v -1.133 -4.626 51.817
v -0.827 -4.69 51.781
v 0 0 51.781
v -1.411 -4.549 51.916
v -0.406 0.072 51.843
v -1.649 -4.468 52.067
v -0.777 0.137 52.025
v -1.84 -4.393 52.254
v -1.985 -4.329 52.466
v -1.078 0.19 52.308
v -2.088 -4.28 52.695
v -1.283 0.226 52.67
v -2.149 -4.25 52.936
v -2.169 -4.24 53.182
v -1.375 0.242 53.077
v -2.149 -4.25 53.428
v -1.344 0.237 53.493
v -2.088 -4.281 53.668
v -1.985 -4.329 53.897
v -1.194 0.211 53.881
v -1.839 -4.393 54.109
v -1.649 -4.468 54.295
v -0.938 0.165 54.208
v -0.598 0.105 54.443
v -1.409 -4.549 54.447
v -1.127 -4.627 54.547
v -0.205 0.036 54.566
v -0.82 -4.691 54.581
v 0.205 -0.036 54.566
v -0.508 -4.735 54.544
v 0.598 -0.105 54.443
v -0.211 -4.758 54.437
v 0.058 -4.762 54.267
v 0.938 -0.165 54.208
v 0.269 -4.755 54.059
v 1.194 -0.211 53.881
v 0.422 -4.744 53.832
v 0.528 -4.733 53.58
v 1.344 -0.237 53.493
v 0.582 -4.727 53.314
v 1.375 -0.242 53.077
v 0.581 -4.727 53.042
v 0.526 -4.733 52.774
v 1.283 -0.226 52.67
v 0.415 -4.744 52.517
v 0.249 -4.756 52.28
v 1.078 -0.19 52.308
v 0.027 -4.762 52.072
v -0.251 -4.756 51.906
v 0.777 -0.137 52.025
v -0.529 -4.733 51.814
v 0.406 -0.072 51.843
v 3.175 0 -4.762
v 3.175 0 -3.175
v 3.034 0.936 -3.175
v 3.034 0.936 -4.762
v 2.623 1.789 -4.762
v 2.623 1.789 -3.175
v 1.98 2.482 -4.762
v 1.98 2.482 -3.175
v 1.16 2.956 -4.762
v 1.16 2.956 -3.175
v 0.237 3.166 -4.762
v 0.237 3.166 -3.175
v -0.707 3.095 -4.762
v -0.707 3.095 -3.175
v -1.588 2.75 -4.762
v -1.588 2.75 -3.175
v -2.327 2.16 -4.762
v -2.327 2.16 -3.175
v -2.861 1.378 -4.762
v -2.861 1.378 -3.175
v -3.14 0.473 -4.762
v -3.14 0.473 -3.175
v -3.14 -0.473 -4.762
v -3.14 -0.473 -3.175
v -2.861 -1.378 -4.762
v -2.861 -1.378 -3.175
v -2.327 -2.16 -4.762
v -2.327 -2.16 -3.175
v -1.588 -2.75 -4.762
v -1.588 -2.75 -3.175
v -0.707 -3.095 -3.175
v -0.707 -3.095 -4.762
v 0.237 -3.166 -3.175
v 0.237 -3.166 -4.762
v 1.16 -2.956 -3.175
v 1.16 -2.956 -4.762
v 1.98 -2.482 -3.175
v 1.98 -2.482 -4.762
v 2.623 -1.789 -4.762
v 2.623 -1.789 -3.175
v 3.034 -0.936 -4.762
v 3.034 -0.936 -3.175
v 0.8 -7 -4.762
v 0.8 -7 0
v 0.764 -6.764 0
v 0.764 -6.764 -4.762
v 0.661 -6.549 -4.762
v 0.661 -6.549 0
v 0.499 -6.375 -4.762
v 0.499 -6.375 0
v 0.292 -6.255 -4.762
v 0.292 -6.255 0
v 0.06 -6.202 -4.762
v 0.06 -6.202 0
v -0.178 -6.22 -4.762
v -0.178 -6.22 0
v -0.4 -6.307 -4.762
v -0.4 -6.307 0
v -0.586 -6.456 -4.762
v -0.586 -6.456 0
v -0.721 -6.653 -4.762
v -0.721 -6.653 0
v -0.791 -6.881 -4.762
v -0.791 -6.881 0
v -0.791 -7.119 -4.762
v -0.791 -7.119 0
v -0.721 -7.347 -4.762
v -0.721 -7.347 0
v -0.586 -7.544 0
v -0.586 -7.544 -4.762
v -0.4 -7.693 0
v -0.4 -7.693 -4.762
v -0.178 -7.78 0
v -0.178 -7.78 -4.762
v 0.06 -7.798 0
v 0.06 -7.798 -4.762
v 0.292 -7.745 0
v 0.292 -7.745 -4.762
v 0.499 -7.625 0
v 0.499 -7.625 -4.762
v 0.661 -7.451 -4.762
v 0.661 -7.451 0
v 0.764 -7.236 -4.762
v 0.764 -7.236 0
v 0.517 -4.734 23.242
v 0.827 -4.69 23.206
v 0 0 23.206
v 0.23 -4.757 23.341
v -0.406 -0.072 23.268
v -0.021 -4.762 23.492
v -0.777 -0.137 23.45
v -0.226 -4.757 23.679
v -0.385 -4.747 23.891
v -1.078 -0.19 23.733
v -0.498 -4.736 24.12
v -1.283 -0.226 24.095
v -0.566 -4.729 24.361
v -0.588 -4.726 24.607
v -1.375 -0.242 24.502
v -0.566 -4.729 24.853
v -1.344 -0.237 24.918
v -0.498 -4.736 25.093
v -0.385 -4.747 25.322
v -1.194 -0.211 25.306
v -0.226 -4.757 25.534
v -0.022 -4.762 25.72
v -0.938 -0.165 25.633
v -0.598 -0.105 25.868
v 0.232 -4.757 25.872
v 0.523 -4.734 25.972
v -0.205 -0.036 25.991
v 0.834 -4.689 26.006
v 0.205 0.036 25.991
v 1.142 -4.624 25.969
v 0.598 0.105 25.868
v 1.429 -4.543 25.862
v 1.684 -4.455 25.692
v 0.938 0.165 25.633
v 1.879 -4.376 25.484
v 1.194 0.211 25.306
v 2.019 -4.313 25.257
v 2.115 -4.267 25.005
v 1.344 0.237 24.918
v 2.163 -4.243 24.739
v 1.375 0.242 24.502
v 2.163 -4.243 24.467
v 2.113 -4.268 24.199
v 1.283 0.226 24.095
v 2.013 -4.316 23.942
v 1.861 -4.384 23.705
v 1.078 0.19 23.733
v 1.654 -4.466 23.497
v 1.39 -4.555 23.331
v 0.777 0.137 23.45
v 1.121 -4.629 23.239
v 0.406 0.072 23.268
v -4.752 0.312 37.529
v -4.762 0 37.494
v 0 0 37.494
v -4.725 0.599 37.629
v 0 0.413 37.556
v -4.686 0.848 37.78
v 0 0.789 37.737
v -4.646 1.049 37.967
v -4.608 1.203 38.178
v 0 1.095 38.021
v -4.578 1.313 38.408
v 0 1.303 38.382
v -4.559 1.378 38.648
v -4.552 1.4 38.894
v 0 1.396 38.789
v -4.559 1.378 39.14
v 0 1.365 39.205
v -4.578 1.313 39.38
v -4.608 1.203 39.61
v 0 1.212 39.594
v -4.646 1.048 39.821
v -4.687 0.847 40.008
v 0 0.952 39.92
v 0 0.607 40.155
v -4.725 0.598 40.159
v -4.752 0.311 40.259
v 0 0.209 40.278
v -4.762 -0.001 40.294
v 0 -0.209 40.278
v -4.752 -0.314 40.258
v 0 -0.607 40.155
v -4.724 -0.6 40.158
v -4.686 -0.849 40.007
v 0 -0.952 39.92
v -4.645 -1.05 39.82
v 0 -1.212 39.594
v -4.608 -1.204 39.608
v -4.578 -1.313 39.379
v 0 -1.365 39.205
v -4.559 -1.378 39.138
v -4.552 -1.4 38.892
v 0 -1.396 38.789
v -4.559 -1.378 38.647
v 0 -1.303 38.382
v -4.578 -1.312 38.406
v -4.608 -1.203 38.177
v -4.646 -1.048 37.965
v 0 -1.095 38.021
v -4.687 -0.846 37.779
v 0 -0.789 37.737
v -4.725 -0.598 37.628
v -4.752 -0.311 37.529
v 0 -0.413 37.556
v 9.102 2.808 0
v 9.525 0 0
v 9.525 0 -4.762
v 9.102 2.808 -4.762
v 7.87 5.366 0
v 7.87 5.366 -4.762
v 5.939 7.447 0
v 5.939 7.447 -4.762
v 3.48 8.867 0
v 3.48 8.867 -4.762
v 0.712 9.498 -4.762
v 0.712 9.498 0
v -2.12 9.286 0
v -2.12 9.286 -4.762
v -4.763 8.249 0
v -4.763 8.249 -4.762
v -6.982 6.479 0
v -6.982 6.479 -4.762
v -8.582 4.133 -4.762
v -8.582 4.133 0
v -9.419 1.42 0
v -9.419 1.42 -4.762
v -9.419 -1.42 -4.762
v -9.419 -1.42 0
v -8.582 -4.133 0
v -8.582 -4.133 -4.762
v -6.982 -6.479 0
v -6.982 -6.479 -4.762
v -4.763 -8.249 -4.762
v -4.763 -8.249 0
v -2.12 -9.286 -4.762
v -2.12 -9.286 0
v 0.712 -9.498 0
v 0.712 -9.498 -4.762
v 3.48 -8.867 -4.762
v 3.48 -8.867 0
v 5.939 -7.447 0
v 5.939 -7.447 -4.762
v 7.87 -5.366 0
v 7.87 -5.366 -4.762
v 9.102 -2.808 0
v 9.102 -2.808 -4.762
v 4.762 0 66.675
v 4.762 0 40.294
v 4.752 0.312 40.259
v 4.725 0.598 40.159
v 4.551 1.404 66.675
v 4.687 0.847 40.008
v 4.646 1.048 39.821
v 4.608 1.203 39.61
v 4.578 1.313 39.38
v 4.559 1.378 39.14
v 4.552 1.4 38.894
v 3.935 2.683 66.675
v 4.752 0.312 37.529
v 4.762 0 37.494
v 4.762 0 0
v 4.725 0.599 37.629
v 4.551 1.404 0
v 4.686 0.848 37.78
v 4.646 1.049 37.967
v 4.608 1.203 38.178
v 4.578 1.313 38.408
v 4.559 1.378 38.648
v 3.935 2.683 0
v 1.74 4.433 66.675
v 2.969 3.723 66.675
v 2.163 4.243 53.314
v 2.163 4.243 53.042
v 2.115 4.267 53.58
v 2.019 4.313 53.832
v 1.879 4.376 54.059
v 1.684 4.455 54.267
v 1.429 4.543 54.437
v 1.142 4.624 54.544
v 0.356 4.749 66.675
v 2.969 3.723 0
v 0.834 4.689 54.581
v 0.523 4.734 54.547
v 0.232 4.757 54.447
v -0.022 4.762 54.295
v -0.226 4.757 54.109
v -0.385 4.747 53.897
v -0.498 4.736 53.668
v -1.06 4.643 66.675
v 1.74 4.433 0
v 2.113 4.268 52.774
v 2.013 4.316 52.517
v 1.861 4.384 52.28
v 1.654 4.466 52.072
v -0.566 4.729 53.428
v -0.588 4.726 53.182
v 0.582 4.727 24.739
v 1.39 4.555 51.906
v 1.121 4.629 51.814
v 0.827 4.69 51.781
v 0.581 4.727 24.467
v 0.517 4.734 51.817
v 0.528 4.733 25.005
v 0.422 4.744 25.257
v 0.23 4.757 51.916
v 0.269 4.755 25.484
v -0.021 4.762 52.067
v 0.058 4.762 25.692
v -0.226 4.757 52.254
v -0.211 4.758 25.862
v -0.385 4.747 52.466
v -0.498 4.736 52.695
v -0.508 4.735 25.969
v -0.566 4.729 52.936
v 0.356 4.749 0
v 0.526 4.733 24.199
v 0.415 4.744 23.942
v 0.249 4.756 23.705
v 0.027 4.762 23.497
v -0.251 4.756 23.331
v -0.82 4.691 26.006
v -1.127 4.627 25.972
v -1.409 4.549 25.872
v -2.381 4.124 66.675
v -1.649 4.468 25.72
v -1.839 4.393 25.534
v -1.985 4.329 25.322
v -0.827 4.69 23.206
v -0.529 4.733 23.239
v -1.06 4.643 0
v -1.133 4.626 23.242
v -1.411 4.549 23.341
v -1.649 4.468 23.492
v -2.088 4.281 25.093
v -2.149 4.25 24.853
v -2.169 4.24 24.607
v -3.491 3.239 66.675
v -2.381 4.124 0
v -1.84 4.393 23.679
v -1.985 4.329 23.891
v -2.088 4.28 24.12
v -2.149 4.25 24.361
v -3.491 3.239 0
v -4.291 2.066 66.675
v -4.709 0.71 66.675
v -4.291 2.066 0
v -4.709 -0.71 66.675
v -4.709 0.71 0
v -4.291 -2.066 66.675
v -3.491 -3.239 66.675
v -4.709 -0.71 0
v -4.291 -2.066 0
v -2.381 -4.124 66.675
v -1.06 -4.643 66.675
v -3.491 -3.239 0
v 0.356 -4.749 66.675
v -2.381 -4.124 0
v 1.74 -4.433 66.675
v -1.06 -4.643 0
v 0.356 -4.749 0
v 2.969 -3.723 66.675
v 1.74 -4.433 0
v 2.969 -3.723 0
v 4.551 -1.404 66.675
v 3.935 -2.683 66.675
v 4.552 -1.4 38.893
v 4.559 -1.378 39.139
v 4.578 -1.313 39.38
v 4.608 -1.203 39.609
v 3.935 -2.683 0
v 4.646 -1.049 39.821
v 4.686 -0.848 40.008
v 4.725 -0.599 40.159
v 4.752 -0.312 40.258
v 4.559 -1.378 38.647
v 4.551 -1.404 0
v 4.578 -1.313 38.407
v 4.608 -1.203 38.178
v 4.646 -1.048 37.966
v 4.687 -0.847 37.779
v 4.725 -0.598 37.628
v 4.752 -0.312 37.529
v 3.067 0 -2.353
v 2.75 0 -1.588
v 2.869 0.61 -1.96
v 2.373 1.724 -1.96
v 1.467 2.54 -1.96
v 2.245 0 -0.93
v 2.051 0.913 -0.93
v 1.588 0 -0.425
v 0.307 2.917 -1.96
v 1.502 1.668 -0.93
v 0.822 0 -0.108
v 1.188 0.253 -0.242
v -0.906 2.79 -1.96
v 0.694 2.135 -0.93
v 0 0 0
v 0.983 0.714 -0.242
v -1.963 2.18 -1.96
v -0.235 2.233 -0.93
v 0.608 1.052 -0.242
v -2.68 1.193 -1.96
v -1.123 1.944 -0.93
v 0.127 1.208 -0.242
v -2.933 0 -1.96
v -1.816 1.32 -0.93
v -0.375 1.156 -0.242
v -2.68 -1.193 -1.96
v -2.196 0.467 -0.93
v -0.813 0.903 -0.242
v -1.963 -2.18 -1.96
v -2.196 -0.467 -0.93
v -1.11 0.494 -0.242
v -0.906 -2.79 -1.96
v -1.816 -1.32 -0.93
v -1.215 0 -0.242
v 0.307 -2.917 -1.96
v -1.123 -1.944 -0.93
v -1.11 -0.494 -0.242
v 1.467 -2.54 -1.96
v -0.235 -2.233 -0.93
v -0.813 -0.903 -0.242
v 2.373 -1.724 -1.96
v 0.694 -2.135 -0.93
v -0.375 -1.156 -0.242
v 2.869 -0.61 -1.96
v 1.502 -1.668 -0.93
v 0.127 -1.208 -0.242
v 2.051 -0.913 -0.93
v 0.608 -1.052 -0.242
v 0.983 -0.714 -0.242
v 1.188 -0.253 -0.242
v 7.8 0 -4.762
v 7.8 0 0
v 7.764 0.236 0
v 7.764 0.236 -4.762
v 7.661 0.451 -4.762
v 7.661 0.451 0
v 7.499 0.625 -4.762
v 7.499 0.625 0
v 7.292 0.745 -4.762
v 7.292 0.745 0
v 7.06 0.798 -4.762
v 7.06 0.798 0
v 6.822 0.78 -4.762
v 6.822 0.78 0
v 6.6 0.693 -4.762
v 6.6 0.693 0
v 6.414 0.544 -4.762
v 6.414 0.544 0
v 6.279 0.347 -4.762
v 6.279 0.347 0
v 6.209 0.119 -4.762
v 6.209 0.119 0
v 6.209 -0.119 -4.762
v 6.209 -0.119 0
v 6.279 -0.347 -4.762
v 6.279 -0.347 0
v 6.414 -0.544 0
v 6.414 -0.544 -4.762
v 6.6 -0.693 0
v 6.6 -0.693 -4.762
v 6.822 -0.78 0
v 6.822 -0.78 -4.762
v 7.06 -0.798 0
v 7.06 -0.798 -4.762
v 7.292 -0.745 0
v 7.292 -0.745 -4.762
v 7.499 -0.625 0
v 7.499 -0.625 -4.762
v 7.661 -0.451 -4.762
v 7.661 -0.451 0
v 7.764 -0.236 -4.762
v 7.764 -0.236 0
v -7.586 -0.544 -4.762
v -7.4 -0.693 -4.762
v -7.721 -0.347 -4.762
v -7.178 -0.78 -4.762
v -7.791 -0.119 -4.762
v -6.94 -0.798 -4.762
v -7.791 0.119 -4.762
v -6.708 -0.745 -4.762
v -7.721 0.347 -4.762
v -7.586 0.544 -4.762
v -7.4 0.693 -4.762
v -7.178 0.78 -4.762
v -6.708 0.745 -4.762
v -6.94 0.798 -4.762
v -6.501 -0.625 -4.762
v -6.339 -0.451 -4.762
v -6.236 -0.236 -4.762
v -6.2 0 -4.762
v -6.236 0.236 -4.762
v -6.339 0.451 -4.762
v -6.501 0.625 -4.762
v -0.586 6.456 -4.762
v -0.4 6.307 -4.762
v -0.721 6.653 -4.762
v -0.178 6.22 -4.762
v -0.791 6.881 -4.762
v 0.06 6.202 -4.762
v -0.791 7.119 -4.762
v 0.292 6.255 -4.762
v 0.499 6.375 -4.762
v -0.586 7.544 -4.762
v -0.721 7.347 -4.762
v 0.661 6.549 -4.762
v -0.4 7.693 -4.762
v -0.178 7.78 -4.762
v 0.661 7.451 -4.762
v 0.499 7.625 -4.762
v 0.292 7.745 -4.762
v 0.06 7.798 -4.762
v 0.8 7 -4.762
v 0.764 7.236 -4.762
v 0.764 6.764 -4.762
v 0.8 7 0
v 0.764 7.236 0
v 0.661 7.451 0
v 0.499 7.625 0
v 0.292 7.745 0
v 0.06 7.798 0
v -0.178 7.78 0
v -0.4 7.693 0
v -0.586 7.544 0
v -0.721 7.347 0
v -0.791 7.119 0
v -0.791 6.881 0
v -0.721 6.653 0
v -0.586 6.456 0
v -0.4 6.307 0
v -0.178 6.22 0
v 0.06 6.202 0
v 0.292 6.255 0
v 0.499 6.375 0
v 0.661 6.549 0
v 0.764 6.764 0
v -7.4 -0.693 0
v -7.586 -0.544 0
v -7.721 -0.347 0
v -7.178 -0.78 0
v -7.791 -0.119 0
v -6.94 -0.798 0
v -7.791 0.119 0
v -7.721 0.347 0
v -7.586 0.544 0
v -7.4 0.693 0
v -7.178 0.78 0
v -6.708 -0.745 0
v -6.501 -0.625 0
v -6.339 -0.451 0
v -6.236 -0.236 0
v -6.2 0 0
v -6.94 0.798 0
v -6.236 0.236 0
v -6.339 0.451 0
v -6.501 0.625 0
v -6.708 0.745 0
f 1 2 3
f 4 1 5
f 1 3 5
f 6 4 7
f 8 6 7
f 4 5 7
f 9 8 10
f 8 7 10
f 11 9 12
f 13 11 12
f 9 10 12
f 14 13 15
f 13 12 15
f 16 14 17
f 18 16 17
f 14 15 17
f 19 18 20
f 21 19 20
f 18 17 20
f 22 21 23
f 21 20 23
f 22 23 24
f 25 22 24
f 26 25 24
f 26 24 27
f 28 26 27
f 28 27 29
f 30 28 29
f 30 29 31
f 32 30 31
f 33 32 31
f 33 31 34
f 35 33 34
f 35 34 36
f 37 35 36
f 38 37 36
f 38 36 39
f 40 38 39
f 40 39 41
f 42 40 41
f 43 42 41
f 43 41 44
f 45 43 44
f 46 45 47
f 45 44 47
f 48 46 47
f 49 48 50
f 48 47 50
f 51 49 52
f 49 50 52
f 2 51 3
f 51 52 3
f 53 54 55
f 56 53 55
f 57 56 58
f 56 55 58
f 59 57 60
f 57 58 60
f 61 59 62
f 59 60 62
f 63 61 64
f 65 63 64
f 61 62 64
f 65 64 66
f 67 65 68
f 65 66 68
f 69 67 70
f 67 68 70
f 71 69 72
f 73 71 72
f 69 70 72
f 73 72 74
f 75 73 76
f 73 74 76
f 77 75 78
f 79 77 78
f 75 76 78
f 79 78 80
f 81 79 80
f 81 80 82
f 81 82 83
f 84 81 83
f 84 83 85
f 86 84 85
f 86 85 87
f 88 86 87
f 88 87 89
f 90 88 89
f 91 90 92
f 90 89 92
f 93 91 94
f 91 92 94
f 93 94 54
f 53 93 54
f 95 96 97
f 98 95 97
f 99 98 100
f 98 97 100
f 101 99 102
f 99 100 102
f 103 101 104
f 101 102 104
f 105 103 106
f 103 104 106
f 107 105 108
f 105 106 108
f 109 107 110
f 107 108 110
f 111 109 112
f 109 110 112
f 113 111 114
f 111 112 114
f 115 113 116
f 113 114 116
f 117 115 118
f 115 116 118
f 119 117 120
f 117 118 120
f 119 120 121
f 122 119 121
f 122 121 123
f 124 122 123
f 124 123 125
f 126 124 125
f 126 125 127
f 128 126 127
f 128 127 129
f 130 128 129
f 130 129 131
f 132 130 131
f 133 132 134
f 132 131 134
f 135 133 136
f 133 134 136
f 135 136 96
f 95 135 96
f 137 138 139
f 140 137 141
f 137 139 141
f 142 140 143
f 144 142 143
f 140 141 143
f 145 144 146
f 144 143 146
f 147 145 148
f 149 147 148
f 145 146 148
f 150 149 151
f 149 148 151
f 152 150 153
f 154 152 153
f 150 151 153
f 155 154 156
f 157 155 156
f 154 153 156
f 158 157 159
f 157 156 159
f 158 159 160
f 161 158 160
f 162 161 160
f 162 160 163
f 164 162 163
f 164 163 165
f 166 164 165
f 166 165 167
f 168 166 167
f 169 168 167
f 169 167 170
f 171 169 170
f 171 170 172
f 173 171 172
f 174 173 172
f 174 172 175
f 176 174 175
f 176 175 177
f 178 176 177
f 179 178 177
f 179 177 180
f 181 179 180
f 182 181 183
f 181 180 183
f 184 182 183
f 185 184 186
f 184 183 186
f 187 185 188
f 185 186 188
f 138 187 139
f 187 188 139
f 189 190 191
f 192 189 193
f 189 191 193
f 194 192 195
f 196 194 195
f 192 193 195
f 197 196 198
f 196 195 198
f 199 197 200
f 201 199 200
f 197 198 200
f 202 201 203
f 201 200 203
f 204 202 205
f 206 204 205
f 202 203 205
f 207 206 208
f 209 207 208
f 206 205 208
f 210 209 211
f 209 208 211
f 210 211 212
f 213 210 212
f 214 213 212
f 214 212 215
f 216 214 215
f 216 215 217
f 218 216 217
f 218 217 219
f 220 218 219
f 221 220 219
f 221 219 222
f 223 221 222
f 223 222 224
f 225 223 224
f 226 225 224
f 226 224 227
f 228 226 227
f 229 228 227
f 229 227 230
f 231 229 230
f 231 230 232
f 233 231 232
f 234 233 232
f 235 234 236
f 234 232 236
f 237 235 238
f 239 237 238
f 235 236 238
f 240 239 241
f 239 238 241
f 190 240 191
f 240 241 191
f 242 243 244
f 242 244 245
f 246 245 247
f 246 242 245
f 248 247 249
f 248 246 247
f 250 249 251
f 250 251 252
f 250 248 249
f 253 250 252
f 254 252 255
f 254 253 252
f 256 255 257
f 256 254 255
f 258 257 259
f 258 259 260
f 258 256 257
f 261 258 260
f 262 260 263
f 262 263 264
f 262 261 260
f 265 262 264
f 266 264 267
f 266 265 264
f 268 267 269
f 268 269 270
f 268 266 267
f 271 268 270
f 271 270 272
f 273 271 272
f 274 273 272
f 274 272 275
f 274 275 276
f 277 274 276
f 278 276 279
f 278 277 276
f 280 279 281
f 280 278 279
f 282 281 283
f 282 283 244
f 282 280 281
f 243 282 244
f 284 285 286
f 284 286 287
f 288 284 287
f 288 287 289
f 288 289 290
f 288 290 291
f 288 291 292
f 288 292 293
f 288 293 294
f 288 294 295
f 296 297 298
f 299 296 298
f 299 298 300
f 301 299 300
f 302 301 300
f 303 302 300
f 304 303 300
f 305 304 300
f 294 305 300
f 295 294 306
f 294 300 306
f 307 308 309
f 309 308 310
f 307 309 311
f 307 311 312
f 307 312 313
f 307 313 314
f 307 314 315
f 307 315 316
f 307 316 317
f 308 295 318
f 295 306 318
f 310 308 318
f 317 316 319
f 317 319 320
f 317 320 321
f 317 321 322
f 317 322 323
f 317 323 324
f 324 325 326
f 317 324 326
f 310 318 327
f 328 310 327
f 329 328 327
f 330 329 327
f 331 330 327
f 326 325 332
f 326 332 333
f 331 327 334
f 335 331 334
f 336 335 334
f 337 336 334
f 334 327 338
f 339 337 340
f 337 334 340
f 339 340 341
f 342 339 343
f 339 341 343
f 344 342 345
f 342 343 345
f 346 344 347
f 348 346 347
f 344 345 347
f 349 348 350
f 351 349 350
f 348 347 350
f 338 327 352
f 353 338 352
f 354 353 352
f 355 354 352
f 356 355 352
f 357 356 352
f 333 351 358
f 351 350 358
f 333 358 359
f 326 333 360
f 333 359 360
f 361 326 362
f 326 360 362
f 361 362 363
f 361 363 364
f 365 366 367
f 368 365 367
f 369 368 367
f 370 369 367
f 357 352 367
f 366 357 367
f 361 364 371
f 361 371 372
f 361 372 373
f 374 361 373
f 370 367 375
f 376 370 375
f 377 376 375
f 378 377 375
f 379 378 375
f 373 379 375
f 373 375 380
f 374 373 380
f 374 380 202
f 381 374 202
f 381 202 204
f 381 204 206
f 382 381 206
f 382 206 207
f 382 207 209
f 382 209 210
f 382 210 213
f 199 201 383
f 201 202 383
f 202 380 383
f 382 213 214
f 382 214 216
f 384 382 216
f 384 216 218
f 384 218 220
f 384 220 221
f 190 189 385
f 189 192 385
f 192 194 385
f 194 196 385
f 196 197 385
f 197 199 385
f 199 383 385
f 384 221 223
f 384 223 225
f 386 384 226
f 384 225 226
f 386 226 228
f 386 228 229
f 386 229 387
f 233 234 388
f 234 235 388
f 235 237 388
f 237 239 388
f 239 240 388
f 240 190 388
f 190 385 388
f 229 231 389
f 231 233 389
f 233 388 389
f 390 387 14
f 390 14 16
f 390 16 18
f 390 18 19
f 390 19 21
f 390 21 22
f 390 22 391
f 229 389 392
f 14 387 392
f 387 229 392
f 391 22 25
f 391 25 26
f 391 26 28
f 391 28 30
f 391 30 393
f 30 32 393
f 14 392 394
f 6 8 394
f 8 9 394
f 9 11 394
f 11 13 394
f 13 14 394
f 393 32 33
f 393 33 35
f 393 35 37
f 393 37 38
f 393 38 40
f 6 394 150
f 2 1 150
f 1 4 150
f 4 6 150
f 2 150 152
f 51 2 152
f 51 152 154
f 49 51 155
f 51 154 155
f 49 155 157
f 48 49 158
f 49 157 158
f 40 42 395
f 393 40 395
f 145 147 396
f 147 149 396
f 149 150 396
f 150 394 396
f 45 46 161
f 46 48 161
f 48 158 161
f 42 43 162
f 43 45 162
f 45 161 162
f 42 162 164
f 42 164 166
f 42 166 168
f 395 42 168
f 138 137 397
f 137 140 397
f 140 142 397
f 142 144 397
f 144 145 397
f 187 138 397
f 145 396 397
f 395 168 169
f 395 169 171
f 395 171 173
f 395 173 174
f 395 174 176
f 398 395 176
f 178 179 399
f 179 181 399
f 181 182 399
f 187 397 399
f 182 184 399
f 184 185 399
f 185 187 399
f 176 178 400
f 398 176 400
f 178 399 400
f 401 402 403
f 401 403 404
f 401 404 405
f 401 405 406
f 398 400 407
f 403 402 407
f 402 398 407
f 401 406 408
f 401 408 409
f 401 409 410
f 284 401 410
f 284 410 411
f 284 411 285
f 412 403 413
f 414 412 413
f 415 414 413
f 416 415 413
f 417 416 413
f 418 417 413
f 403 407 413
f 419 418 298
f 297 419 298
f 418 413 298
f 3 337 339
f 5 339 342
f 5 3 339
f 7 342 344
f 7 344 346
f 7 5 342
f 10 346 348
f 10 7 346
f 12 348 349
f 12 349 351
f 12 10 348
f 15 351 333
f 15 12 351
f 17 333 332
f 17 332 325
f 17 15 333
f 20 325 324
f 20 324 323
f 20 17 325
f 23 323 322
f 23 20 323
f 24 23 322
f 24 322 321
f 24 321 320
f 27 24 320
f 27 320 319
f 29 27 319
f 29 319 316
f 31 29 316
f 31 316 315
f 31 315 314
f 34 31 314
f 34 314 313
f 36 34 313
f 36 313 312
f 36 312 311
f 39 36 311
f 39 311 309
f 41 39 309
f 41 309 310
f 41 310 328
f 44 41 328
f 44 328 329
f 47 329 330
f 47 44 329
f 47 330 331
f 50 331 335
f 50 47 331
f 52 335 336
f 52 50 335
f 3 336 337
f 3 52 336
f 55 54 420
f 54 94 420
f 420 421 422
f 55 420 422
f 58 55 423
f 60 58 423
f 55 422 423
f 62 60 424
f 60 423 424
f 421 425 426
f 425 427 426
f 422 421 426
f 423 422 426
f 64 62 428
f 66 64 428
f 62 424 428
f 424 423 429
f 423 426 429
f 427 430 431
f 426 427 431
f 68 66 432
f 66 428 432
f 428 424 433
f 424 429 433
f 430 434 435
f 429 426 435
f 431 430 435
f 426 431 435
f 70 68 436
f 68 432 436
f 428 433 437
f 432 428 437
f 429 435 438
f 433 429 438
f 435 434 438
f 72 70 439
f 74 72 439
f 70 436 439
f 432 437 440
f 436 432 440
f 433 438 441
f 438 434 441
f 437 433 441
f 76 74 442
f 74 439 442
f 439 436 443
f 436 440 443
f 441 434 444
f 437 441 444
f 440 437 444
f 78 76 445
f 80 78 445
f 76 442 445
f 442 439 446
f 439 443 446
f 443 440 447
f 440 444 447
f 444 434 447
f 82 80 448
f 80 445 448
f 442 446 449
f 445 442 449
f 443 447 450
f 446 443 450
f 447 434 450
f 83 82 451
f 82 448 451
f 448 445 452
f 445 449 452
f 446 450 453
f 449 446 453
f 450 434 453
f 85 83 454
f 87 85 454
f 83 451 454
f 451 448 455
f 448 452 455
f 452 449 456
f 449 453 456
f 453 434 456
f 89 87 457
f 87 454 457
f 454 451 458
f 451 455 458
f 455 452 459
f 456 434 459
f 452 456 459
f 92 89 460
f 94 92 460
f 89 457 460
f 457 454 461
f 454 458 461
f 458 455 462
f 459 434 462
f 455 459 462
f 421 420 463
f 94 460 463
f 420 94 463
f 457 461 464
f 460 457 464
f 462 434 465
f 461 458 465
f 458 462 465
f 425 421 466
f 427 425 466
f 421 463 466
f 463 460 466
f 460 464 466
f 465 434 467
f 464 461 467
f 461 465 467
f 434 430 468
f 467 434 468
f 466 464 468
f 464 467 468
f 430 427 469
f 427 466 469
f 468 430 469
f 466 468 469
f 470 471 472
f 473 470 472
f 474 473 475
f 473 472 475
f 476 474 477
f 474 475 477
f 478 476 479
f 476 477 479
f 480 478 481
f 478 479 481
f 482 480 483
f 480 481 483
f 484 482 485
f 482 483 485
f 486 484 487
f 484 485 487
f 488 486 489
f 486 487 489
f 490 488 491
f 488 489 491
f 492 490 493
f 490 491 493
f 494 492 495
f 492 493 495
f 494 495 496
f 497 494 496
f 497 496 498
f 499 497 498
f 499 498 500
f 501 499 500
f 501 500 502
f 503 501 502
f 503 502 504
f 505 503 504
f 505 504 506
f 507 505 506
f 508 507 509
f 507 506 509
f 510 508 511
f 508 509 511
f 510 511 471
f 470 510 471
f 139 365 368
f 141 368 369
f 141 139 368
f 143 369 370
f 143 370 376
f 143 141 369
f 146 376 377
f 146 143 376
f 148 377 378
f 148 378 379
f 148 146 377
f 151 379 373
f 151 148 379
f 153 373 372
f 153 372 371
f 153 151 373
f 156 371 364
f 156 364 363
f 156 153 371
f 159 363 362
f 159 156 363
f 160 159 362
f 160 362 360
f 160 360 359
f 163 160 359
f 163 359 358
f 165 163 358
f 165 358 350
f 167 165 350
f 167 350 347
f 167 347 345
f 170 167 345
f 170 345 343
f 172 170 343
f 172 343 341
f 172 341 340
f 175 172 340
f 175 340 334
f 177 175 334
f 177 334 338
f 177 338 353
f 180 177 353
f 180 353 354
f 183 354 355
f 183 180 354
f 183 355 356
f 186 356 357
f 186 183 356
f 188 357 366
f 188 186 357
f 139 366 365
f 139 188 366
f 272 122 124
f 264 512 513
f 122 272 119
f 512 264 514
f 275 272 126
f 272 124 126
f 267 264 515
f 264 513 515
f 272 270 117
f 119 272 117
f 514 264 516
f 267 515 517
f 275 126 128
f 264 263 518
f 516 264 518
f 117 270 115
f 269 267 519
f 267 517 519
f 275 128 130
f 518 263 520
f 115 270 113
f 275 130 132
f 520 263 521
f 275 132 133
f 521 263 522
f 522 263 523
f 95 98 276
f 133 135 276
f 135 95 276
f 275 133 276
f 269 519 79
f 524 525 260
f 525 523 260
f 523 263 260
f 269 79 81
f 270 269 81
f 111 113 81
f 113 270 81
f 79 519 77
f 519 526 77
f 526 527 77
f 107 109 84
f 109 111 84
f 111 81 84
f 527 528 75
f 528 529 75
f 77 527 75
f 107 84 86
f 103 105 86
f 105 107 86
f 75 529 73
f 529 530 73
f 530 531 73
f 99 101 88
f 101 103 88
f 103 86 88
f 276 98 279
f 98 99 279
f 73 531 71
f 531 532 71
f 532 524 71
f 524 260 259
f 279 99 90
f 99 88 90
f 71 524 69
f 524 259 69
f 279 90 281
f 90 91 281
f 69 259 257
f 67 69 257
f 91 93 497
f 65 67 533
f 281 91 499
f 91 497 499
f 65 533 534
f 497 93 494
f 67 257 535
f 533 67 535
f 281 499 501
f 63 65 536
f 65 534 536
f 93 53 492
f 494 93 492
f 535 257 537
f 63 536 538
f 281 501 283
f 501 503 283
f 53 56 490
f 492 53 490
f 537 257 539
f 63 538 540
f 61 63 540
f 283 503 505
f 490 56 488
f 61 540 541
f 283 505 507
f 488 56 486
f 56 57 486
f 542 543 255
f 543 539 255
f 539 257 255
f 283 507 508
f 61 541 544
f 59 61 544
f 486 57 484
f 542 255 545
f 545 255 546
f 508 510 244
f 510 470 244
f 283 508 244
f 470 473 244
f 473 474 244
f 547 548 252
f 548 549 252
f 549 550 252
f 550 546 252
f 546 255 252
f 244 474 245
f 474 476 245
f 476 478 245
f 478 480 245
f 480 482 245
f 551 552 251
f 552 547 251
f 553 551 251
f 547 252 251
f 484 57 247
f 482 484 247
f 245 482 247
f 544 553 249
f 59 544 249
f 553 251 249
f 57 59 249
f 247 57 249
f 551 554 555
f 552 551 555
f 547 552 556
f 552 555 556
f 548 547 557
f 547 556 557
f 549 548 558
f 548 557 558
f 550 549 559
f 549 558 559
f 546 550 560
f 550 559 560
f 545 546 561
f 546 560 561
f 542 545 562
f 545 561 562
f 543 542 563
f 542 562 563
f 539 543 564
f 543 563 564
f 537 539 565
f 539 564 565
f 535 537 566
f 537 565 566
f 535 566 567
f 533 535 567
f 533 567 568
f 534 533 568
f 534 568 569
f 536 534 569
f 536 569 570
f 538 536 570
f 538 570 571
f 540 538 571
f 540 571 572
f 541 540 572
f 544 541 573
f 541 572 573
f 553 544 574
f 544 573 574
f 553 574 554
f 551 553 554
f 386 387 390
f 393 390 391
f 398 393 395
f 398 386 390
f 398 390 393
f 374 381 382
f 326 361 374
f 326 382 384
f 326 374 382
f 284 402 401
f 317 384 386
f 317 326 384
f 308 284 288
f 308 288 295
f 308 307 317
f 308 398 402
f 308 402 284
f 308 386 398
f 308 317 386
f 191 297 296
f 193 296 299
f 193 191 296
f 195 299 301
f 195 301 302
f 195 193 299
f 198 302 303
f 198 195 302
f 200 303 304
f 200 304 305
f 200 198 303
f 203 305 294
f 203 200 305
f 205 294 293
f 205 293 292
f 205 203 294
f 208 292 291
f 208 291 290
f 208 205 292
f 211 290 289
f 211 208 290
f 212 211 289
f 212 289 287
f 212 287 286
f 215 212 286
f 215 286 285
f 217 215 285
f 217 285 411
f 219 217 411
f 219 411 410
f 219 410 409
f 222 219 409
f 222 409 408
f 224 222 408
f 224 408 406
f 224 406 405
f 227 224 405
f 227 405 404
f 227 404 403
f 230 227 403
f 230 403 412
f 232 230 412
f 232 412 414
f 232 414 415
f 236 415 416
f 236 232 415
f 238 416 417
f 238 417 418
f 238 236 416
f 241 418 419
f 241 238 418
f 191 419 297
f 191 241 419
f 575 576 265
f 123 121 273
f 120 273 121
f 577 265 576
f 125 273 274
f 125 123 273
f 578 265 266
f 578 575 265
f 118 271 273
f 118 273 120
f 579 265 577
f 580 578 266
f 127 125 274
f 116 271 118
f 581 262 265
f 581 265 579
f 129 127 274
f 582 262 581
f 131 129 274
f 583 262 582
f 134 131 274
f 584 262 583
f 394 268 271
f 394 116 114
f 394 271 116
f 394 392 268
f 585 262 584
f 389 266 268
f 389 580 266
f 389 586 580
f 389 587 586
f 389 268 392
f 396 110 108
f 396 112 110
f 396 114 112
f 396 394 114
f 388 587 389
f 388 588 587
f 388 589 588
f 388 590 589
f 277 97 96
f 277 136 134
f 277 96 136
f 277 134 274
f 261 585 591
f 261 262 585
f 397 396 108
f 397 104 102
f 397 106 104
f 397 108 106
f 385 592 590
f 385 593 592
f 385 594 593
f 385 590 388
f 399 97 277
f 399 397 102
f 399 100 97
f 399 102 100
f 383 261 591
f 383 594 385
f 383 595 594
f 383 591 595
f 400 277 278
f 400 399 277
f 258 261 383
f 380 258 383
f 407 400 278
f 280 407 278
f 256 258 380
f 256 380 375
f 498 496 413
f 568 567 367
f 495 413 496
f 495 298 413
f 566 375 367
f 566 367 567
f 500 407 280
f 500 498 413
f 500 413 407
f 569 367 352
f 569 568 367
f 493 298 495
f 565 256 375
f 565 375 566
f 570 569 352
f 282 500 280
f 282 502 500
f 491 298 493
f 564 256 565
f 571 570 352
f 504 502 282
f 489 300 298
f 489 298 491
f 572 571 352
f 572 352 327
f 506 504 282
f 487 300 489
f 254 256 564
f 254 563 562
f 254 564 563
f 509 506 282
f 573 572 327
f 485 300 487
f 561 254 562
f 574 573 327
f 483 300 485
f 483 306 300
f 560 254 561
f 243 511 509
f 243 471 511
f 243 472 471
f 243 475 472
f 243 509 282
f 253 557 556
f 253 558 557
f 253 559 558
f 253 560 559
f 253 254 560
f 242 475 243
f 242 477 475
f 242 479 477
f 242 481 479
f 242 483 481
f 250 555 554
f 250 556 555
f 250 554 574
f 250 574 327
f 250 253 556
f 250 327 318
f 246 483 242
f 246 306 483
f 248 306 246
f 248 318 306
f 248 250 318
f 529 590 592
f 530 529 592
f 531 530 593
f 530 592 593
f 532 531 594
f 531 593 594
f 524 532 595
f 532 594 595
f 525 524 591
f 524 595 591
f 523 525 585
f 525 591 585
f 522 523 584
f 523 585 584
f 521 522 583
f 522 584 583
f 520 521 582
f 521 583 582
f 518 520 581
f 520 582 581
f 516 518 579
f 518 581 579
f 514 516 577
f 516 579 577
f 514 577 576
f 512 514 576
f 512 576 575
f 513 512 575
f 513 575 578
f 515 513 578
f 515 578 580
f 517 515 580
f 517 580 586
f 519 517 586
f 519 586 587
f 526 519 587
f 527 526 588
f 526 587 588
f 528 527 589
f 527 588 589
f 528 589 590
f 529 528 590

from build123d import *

# Parameters (mm, degrees)
SKETCH1_R               = 4.7625
BOSS_EXTRUDE1_DEPTH     = 66.675
SKETCH1_4_R             = 9.525
SKETCH1_4_R_2           = 0.800000051
SKETCH1_4_R_3           = 4.7625
SKETCH1_4_R_4           = 3.175
BOSS_EXTRUDE2_DEPTH     = 4.7625
FILLET1_R               = 3.175
SKETCH3_R               = 1.399999994
CUT_EXTRUDE2_DEPTH      = 10.525
CUT_EXTRUDE2_DEPTH_BACK = 10.525
SKETCH4_R               = 1.399999994
CUT_EXTRUDE3_DEPTH      = 12.03429274
CUT_EXTRUDE3_DEPTH_BACK = 12.03429274
SKETCH5_R               = 1.399999994
CUT_EXTRUDE4_DEPTH      = 12.03429274
CUT_EXTRUDE4_DEPTH_BACK = 12.03429274


with BuildPart() as part:
    # Sketch1 → Boss-Extrude1 (new body)
    with BuildSketch(Plane.XY):
        Circle(SKETCH1_R)
    extrude(amount=BOSS_EXTRUDE1_DEPTH)

    # Sketch1<4> → Boss-Extrude2 (add)
    with BuildSketch(Plane.XY):
        Circle(SKETCH1_4_R)
        with Locations((-6.99999997, 0)):
            Circle(SKETCH1_4_R_2, mode=Mode.SUBTRACT)
        with Locations((0, -6.99999997)):
            Circle(SKETCH1_4_R_2, mode=Mode.SUBTRACT)
        with Locations((6.99999997, 0)):
            Circle(SKETCH1_4_R_2, mode=Mode.SUBTRACT)
        with Locations((0, 6.99999997)):
            Circle(SKETCH1_4_R_2, mode=Mode.SUBTRACT)
        Circle(SKETCH1_4_R_3, mode=Mode.SUBTRACT)
        Circle(SKETCH1_4_R_3)
        Circle(SKETCH1_4_R_4, mode=Mode.SUBTRACT)
    extrude(amount=-BOSS_EXTRUDE2_DEPTH)

    # Fillet1
    fillet1_edges = [part.edges().sort_by_distance(p)[0] for p in [
        (-3.175, 0, 0),
    ]]
    fillet(fillet1_edges, radius=FILLET1_R)

    # Sketch3 → Cut-Extrude2 (cut, two sides)
    with BuildSketch(Plane(origin=(0, 0, 0), x_dir=(0, 0, -1), z_dir=(1, 0, 0))) as cut_extrude2_sk:
        with Locations((-38.89375, 0)):
            Circle(SKETCH3_R)
    extrude(amount=CUT_EXTRUDE2_DEPTH, mode=Mode.SUBTRACT)
    extrude(cut_extrude2_sk.sketch, amount=-CUT_EXTRUDE2_DEPTH_BACK, mode=Mode.SUBTRACT)

    # Sketch4 → Cut-Extrude3 (cut, two sides)
    with BuildSketch(Plane(origin=(0, 0, 0), x_dir=(0, 0, -1), z_dir=(0.173648178, 0.984807753, 0))) as cut_extrude3_sk:
        with Locations((-53.18125, 0)):
            Circle(SKETCH4_R)
    extrude(amount=CUT_EXTRUDE3_DEPTH, mode=Mode.SUBTRACT)
    extrude(cut_extrude3_sk.sketch, amount=-CUT_EXTRUDE3_DEPTH_BACK, mode=Mode.SUBTRACT)

    # Sketch5 → Cut-Extrude4 (cut, two sides)
    with BuildSketch(Plane(origin=(0, 0, 0), x_dir=(0, 0, -1), z_dir=(-0.173648178, 0.984807753, 0))) as cut_extrude4_sk:
        with Locations((-24.60625, 0)):
            Circle(SKETCH5_R)
    extrude(amount=CUT_EXTRUDE4_DEPTH, mode=Mode.SUBTRACT)
    extrude(cut_extrude4_sk.sketch, amount=-CUT_EXTRUDE4_DEPTH_BACK, mode=Mode.SUBTRACT)


solid = part.part
